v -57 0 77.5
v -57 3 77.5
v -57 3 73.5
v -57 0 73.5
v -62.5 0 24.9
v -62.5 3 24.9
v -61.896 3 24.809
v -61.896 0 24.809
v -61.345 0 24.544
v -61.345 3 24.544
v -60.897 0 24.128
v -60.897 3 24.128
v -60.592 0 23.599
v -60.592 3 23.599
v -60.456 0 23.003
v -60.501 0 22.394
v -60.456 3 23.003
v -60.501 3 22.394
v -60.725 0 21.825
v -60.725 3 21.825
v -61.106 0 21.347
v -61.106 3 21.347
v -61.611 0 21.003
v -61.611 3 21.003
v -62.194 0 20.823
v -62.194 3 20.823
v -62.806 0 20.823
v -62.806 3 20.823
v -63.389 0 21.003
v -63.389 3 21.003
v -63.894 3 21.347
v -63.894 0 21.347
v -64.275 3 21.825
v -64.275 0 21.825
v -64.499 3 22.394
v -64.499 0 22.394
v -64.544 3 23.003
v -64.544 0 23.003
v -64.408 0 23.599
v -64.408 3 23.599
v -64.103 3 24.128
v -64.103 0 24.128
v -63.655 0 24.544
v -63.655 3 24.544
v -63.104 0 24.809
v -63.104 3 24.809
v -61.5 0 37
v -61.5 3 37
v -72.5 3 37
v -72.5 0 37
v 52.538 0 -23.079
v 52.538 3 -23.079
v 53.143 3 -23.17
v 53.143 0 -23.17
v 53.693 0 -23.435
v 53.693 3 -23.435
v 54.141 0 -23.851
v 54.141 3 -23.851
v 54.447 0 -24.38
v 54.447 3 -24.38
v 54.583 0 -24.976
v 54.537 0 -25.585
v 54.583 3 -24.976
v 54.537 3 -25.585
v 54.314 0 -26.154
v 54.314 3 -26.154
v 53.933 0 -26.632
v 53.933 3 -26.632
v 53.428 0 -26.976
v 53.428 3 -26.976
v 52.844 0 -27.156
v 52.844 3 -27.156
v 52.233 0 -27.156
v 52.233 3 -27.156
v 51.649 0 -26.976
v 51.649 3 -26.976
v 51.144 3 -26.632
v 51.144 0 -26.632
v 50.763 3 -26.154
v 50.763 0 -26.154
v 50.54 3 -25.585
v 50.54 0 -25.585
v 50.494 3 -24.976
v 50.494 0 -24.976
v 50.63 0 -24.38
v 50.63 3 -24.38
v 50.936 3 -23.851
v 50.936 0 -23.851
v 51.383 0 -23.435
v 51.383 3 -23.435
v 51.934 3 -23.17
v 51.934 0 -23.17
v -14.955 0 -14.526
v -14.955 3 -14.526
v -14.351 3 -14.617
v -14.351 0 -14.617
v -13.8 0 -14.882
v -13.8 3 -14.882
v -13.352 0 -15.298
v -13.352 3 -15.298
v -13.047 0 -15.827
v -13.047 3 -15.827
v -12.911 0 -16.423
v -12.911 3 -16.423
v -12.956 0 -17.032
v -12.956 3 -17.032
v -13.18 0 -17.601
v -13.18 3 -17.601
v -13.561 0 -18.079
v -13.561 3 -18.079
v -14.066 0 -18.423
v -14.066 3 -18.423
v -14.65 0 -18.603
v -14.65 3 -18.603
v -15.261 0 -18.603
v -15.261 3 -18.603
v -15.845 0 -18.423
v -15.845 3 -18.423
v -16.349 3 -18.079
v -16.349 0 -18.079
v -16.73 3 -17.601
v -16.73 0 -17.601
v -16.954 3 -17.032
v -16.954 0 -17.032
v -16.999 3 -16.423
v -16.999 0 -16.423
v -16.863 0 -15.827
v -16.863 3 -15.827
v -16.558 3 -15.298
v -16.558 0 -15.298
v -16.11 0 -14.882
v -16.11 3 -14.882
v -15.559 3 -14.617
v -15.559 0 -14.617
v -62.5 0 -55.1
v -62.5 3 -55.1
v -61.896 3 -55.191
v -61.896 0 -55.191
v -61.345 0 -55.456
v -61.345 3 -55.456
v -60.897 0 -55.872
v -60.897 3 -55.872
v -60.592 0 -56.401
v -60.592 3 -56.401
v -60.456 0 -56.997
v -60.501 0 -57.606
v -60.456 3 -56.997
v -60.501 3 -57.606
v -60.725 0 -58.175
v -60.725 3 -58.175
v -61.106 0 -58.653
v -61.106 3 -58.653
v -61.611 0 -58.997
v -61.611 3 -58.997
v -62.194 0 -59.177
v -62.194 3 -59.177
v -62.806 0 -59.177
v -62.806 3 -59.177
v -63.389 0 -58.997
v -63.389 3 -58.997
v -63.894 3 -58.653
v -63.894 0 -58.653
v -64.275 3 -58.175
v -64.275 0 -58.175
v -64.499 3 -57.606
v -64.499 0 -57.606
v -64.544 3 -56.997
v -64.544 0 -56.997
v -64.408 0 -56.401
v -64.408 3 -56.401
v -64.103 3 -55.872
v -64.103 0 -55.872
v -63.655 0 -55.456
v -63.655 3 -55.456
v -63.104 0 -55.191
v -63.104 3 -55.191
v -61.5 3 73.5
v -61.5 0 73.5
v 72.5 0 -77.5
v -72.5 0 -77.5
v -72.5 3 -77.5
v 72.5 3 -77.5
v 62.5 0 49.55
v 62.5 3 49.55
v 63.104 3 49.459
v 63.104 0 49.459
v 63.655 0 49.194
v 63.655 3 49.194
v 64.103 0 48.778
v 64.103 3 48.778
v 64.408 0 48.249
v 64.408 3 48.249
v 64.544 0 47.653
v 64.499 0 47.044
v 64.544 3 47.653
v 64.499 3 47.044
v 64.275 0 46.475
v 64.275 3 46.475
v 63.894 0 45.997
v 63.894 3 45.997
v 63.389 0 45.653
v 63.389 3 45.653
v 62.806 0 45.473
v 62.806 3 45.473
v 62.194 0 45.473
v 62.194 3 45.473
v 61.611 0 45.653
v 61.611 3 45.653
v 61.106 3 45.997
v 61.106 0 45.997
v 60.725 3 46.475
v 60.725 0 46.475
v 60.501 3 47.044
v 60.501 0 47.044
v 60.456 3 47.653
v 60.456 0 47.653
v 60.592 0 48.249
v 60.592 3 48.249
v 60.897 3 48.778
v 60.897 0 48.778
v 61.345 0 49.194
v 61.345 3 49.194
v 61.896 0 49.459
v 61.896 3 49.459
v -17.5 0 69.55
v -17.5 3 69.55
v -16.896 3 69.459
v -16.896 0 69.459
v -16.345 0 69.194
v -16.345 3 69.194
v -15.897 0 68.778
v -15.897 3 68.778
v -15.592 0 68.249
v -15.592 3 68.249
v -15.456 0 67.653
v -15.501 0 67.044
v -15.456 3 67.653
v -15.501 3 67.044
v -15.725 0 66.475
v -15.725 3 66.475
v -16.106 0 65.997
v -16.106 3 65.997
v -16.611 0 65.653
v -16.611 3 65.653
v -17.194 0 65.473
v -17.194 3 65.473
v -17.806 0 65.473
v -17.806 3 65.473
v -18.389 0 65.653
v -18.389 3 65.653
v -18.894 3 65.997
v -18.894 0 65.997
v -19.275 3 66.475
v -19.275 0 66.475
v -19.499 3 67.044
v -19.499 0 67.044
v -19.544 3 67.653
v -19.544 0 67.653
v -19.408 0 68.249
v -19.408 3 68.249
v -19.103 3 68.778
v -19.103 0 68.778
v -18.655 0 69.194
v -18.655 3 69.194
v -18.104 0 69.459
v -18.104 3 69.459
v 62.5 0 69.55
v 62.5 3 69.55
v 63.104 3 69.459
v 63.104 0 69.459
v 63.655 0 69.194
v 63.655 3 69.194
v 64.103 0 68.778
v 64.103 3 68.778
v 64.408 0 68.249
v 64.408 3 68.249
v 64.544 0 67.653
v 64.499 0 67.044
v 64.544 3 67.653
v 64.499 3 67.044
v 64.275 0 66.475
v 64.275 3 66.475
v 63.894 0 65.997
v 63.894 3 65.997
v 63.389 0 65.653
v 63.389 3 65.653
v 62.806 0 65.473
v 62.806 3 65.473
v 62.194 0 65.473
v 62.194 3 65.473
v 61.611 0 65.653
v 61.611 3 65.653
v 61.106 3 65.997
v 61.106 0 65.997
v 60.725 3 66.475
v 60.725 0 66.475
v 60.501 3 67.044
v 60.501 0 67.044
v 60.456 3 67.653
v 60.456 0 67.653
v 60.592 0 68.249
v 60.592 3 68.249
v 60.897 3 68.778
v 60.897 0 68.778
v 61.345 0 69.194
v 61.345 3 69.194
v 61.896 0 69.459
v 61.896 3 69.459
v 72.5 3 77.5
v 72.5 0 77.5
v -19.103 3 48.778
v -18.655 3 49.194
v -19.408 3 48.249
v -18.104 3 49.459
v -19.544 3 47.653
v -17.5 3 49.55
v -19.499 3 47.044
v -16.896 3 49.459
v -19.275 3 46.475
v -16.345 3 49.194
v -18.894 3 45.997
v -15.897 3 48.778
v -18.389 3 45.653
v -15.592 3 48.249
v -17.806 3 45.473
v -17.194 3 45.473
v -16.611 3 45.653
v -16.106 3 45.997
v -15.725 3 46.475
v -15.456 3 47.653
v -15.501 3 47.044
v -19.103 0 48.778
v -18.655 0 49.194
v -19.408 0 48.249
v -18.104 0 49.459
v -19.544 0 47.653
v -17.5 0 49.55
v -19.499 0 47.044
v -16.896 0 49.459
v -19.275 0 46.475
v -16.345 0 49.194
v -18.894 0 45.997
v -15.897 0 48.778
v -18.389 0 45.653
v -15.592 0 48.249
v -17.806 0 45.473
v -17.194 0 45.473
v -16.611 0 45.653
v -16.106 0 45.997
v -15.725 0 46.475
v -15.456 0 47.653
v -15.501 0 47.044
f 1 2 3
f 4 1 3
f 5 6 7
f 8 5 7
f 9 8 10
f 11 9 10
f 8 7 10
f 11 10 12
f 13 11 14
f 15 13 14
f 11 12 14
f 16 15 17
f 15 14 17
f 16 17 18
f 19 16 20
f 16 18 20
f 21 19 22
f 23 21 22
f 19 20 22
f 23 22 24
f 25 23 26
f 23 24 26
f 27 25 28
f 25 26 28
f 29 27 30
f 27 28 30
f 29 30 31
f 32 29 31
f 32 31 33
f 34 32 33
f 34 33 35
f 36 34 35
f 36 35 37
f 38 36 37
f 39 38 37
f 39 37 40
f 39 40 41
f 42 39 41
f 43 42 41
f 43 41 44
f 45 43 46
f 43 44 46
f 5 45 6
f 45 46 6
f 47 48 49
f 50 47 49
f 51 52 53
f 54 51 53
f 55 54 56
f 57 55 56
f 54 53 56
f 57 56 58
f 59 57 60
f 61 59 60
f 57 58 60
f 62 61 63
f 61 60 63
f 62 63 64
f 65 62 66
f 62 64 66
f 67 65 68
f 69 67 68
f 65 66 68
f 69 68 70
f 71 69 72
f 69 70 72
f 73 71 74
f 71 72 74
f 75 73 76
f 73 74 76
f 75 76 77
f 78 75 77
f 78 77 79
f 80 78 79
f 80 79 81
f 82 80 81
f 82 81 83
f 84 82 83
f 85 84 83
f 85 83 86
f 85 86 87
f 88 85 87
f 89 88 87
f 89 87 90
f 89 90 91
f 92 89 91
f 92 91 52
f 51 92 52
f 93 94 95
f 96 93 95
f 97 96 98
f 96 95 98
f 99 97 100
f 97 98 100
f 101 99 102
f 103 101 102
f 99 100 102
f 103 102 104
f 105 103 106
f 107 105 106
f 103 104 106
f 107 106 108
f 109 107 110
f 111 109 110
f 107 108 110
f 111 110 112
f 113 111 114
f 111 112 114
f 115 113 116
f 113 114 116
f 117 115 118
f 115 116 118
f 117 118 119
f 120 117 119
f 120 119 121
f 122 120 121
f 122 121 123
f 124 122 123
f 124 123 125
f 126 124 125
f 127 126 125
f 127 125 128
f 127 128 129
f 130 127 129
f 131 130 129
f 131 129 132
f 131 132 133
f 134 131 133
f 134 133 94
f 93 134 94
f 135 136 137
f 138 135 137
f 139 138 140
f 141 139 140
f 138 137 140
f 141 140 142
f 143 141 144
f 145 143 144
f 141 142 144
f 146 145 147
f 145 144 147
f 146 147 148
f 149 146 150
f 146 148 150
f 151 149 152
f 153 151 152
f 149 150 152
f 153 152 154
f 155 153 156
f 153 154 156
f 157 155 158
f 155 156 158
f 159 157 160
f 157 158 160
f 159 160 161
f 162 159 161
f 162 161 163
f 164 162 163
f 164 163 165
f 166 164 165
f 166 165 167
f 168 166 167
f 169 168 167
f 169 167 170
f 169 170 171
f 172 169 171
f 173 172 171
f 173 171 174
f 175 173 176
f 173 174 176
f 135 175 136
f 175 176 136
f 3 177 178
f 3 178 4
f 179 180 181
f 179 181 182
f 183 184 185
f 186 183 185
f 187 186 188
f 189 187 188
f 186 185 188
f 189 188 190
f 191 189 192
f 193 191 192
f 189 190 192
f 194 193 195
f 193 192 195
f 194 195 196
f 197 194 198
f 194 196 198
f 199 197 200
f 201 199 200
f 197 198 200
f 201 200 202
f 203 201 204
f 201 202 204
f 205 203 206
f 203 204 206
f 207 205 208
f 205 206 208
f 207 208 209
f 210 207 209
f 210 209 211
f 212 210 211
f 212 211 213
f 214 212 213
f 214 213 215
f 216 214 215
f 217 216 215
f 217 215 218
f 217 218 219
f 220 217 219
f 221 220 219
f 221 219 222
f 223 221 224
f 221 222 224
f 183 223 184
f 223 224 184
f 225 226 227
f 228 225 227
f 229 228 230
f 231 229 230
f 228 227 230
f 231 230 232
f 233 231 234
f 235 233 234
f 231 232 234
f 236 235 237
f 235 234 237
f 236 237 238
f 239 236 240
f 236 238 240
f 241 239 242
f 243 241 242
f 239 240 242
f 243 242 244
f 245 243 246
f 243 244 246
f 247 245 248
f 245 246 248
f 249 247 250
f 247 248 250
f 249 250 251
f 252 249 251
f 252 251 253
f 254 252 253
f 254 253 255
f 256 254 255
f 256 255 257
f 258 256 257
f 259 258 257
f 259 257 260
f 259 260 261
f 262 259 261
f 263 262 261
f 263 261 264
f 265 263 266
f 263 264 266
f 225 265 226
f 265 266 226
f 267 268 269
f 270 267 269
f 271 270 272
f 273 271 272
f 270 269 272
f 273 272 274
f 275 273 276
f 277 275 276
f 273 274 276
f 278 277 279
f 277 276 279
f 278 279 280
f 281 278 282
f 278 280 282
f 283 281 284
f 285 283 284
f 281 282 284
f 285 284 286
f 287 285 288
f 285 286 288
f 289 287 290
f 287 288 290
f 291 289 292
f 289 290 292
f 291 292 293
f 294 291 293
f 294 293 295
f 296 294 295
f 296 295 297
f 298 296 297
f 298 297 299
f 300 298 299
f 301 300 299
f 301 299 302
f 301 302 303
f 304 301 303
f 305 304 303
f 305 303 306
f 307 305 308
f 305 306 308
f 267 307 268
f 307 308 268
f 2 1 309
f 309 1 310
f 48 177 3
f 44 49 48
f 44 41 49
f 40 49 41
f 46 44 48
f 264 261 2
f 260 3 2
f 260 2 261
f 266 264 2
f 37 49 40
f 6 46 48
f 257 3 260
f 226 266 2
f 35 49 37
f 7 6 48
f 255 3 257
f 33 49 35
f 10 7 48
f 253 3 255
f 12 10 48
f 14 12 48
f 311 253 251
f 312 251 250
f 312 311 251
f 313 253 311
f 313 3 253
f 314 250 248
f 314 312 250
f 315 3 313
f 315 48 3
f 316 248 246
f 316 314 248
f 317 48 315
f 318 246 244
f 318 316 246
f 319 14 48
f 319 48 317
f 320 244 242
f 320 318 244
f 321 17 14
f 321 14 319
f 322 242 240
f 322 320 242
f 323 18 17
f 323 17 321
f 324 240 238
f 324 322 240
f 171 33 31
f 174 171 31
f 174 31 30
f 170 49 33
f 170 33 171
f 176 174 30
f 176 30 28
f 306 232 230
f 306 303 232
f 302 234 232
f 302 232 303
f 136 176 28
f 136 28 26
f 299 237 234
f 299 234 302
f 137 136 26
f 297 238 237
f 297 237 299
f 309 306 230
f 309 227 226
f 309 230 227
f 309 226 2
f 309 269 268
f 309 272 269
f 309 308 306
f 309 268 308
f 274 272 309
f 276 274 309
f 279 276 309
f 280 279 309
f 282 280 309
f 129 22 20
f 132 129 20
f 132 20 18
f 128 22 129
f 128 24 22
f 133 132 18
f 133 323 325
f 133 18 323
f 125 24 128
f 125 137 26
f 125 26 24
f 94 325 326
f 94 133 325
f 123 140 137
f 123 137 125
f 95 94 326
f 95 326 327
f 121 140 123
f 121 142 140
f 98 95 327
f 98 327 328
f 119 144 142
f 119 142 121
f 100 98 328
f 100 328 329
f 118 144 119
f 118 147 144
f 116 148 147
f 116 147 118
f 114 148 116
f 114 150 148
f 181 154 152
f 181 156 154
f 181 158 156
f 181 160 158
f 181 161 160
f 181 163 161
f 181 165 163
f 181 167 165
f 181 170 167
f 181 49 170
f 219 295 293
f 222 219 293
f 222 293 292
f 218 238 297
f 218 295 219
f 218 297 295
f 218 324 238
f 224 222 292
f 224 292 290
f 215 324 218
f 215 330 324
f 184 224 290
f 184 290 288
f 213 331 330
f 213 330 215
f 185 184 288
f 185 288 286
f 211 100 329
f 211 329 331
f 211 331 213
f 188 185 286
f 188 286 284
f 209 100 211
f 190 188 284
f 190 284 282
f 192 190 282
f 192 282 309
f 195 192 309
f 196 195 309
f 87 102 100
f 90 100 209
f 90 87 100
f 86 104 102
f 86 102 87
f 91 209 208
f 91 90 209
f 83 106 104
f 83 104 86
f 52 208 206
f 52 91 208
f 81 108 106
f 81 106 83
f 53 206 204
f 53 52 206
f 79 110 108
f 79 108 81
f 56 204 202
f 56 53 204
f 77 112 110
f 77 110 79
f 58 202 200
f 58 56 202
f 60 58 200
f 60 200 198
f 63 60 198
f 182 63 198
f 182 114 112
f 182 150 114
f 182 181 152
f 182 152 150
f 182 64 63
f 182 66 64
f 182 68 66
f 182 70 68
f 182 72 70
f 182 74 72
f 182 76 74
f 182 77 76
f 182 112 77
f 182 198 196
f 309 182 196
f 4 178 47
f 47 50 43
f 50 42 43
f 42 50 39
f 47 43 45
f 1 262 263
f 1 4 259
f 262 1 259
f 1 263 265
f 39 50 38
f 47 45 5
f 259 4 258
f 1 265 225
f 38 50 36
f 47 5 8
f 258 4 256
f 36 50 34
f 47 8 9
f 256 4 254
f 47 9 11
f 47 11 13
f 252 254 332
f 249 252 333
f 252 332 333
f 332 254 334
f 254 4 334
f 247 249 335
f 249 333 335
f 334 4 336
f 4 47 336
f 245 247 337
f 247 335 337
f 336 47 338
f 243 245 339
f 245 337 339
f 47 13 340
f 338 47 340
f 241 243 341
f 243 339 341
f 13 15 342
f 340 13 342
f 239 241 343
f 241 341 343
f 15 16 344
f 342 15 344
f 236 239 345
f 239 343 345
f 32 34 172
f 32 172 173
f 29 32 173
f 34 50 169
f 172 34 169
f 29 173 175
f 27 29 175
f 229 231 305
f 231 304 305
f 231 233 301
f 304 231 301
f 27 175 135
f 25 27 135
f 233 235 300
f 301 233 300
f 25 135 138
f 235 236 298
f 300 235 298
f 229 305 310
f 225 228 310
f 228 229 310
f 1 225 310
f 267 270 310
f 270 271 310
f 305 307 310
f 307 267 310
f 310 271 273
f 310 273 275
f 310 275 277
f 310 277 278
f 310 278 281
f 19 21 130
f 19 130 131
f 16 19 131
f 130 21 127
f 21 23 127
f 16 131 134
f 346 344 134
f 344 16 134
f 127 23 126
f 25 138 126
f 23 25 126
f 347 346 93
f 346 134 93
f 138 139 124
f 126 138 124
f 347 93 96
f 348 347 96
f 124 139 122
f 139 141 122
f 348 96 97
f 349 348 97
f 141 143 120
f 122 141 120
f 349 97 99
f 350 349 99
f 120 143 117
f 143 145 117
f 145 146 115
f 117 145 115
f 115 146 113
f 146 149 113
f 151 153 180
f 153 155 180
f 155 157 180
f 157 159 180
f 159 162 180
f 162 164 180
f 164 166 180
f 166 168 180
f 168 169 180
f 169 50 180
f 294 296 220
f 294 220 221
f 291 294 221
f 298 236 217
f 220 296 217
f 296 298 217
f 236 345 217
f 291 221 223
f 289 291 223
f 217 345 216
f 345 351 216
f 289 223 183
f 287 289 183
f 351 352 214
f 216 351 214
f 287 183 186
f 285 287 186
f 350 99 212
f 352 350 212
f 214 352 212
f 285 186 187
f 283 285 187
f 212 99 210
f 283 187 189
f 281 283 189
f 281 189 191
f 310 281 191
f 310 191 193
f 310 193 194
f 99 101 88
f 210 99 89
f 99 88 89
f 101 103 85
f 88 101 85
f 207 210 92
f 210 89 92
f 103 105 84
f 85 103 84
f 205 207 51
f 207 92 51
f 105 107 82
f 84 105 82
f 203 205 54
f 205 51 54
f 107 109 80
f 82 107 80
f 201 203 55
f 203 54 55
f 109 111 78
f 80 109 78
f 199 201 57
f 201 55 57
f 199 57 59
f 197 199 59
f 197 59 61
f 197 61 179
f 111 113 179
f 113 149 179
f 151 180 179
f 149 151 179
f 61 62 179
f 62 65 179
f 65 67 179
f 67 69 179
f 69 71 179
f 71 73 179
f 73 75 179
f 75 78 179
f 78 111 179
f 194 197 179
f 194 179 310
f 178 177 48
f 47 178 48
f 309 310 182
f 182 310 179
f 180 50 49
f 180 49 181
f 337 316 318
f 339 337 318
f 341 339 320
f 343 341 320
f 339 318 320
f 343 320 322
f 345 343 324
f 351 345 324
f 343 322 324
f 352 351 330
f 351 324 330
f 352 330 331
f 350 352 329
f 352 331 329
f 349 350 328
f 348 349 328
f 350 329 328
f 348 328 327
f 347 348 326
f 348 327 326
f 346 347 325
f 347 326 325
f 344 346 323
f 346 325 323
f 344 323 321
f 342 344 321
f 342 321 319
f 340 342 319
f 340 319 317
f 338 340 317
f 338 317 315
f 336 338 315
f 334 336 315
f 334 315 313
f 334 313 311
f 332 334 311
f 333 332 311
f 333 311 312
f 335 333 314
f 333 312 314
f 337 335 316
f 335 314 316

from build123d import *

# Parameters (mm, degrees)
SKETCH1_W           = 145
SKETCH1_H           = 155
BOSS_EXTRUDE1_DEPTH = 3
SKETCH3_W           = 4.5
SKETCH3_H           = 4
CUT_EXTRUDE1_DEPTH  = 3
SKETCH4_R           = 2.05
CUT_EXTRUDE2_DEPTH  = 3
SKETCH5_R           = 2.05
CUT_EXTRUDE3_DEPTH  = 10


with BuildPart() as part:
    # Sketch1 → Boss-Extrude1 (new body)
    with BuildSketch(Plane(origin=(0, 0, 0), x_dir=(1, 0, 0), z_dir=(0, 1, 0))):
        Rectangle(SKETCH1_W, SKETCH1_H)
    extrude(amount=BOSS_EXTRUDE1_DEPTH)

    # Sketch3 → Cut-Extrude1 (cut)
    with BuildSketch(Plane(origin=(0, 3, 0), x_dir=(1, 0, 0), z_dir=(0, 1, 0))):
        Polygon((-61.5, -37), (-72.5, -37), (-72.5, -77.5), (-61.5, -77.5), (-61.5, -73.5), align=None)
        with Locations((-59.25, -75.5)):
            Rectangle(SKETCH3_W, SKETCH3_H)
    extrude(amount=-CUT_EXTRUDE1_DEPTH, mode=Mode.SUBTRACT)

    # Sketch4 → Cut-Extrude2 (cut)
    with BuildSketch(Plane(origin=(0, 3, 0), x_dir=(1, 0, 0), z_dir=(0, 1, 0))):
        with Locations(Location((-17.5, -67.5, 0), (0, 0, 270))):
            Circle(SKETCH4_R)
        with Locations(Location((62.5, -67.5, 0), (0, 0, 270))):
            Circle(SKETCH4_R)
        with Locations(Location((-62.5, -22.85, 0), (0, 0, 270))):
            Circle(SKETCH4_R)
        with Locations(Location((-62.5, 57.15, 0), (0, 0, 270))):
            Circle(SKETCH4_R)
        with Locations(Location((62.5, -47.5, 0), (0, 0, 270))):
            Circle(SKETCH4_R)
        with Locations(Location((-17.5, -47.5, 0), (0, 0, 270))):
            Circle(SKETCH4_R)
    extrude(amount=-CUT_EXTRUDE2_DEPTH, mode=Mode.SUBTRACT)

    # Sketch5 → Cut-Extrude3 (cut)
    with BuildSketch(Plane(origin=(0, 3, 0), x_dir=(1, 0, 0), z_dir=(0, 1, 0))):
        with Locations(Location((52.538287268, 25.128851924, 0), (0, 0, 270))):
            Circle(SKETCH5_R)
        with Locations(Location((-14.95509898, 16.575946892, 0), (0, 0, 270))):
            Circle(SKETCH5_R)
    extrude(amount=-CUT_EXTRUDE3_DEPTH, mode=Mode.SUBTRACT)


solid = part.part
